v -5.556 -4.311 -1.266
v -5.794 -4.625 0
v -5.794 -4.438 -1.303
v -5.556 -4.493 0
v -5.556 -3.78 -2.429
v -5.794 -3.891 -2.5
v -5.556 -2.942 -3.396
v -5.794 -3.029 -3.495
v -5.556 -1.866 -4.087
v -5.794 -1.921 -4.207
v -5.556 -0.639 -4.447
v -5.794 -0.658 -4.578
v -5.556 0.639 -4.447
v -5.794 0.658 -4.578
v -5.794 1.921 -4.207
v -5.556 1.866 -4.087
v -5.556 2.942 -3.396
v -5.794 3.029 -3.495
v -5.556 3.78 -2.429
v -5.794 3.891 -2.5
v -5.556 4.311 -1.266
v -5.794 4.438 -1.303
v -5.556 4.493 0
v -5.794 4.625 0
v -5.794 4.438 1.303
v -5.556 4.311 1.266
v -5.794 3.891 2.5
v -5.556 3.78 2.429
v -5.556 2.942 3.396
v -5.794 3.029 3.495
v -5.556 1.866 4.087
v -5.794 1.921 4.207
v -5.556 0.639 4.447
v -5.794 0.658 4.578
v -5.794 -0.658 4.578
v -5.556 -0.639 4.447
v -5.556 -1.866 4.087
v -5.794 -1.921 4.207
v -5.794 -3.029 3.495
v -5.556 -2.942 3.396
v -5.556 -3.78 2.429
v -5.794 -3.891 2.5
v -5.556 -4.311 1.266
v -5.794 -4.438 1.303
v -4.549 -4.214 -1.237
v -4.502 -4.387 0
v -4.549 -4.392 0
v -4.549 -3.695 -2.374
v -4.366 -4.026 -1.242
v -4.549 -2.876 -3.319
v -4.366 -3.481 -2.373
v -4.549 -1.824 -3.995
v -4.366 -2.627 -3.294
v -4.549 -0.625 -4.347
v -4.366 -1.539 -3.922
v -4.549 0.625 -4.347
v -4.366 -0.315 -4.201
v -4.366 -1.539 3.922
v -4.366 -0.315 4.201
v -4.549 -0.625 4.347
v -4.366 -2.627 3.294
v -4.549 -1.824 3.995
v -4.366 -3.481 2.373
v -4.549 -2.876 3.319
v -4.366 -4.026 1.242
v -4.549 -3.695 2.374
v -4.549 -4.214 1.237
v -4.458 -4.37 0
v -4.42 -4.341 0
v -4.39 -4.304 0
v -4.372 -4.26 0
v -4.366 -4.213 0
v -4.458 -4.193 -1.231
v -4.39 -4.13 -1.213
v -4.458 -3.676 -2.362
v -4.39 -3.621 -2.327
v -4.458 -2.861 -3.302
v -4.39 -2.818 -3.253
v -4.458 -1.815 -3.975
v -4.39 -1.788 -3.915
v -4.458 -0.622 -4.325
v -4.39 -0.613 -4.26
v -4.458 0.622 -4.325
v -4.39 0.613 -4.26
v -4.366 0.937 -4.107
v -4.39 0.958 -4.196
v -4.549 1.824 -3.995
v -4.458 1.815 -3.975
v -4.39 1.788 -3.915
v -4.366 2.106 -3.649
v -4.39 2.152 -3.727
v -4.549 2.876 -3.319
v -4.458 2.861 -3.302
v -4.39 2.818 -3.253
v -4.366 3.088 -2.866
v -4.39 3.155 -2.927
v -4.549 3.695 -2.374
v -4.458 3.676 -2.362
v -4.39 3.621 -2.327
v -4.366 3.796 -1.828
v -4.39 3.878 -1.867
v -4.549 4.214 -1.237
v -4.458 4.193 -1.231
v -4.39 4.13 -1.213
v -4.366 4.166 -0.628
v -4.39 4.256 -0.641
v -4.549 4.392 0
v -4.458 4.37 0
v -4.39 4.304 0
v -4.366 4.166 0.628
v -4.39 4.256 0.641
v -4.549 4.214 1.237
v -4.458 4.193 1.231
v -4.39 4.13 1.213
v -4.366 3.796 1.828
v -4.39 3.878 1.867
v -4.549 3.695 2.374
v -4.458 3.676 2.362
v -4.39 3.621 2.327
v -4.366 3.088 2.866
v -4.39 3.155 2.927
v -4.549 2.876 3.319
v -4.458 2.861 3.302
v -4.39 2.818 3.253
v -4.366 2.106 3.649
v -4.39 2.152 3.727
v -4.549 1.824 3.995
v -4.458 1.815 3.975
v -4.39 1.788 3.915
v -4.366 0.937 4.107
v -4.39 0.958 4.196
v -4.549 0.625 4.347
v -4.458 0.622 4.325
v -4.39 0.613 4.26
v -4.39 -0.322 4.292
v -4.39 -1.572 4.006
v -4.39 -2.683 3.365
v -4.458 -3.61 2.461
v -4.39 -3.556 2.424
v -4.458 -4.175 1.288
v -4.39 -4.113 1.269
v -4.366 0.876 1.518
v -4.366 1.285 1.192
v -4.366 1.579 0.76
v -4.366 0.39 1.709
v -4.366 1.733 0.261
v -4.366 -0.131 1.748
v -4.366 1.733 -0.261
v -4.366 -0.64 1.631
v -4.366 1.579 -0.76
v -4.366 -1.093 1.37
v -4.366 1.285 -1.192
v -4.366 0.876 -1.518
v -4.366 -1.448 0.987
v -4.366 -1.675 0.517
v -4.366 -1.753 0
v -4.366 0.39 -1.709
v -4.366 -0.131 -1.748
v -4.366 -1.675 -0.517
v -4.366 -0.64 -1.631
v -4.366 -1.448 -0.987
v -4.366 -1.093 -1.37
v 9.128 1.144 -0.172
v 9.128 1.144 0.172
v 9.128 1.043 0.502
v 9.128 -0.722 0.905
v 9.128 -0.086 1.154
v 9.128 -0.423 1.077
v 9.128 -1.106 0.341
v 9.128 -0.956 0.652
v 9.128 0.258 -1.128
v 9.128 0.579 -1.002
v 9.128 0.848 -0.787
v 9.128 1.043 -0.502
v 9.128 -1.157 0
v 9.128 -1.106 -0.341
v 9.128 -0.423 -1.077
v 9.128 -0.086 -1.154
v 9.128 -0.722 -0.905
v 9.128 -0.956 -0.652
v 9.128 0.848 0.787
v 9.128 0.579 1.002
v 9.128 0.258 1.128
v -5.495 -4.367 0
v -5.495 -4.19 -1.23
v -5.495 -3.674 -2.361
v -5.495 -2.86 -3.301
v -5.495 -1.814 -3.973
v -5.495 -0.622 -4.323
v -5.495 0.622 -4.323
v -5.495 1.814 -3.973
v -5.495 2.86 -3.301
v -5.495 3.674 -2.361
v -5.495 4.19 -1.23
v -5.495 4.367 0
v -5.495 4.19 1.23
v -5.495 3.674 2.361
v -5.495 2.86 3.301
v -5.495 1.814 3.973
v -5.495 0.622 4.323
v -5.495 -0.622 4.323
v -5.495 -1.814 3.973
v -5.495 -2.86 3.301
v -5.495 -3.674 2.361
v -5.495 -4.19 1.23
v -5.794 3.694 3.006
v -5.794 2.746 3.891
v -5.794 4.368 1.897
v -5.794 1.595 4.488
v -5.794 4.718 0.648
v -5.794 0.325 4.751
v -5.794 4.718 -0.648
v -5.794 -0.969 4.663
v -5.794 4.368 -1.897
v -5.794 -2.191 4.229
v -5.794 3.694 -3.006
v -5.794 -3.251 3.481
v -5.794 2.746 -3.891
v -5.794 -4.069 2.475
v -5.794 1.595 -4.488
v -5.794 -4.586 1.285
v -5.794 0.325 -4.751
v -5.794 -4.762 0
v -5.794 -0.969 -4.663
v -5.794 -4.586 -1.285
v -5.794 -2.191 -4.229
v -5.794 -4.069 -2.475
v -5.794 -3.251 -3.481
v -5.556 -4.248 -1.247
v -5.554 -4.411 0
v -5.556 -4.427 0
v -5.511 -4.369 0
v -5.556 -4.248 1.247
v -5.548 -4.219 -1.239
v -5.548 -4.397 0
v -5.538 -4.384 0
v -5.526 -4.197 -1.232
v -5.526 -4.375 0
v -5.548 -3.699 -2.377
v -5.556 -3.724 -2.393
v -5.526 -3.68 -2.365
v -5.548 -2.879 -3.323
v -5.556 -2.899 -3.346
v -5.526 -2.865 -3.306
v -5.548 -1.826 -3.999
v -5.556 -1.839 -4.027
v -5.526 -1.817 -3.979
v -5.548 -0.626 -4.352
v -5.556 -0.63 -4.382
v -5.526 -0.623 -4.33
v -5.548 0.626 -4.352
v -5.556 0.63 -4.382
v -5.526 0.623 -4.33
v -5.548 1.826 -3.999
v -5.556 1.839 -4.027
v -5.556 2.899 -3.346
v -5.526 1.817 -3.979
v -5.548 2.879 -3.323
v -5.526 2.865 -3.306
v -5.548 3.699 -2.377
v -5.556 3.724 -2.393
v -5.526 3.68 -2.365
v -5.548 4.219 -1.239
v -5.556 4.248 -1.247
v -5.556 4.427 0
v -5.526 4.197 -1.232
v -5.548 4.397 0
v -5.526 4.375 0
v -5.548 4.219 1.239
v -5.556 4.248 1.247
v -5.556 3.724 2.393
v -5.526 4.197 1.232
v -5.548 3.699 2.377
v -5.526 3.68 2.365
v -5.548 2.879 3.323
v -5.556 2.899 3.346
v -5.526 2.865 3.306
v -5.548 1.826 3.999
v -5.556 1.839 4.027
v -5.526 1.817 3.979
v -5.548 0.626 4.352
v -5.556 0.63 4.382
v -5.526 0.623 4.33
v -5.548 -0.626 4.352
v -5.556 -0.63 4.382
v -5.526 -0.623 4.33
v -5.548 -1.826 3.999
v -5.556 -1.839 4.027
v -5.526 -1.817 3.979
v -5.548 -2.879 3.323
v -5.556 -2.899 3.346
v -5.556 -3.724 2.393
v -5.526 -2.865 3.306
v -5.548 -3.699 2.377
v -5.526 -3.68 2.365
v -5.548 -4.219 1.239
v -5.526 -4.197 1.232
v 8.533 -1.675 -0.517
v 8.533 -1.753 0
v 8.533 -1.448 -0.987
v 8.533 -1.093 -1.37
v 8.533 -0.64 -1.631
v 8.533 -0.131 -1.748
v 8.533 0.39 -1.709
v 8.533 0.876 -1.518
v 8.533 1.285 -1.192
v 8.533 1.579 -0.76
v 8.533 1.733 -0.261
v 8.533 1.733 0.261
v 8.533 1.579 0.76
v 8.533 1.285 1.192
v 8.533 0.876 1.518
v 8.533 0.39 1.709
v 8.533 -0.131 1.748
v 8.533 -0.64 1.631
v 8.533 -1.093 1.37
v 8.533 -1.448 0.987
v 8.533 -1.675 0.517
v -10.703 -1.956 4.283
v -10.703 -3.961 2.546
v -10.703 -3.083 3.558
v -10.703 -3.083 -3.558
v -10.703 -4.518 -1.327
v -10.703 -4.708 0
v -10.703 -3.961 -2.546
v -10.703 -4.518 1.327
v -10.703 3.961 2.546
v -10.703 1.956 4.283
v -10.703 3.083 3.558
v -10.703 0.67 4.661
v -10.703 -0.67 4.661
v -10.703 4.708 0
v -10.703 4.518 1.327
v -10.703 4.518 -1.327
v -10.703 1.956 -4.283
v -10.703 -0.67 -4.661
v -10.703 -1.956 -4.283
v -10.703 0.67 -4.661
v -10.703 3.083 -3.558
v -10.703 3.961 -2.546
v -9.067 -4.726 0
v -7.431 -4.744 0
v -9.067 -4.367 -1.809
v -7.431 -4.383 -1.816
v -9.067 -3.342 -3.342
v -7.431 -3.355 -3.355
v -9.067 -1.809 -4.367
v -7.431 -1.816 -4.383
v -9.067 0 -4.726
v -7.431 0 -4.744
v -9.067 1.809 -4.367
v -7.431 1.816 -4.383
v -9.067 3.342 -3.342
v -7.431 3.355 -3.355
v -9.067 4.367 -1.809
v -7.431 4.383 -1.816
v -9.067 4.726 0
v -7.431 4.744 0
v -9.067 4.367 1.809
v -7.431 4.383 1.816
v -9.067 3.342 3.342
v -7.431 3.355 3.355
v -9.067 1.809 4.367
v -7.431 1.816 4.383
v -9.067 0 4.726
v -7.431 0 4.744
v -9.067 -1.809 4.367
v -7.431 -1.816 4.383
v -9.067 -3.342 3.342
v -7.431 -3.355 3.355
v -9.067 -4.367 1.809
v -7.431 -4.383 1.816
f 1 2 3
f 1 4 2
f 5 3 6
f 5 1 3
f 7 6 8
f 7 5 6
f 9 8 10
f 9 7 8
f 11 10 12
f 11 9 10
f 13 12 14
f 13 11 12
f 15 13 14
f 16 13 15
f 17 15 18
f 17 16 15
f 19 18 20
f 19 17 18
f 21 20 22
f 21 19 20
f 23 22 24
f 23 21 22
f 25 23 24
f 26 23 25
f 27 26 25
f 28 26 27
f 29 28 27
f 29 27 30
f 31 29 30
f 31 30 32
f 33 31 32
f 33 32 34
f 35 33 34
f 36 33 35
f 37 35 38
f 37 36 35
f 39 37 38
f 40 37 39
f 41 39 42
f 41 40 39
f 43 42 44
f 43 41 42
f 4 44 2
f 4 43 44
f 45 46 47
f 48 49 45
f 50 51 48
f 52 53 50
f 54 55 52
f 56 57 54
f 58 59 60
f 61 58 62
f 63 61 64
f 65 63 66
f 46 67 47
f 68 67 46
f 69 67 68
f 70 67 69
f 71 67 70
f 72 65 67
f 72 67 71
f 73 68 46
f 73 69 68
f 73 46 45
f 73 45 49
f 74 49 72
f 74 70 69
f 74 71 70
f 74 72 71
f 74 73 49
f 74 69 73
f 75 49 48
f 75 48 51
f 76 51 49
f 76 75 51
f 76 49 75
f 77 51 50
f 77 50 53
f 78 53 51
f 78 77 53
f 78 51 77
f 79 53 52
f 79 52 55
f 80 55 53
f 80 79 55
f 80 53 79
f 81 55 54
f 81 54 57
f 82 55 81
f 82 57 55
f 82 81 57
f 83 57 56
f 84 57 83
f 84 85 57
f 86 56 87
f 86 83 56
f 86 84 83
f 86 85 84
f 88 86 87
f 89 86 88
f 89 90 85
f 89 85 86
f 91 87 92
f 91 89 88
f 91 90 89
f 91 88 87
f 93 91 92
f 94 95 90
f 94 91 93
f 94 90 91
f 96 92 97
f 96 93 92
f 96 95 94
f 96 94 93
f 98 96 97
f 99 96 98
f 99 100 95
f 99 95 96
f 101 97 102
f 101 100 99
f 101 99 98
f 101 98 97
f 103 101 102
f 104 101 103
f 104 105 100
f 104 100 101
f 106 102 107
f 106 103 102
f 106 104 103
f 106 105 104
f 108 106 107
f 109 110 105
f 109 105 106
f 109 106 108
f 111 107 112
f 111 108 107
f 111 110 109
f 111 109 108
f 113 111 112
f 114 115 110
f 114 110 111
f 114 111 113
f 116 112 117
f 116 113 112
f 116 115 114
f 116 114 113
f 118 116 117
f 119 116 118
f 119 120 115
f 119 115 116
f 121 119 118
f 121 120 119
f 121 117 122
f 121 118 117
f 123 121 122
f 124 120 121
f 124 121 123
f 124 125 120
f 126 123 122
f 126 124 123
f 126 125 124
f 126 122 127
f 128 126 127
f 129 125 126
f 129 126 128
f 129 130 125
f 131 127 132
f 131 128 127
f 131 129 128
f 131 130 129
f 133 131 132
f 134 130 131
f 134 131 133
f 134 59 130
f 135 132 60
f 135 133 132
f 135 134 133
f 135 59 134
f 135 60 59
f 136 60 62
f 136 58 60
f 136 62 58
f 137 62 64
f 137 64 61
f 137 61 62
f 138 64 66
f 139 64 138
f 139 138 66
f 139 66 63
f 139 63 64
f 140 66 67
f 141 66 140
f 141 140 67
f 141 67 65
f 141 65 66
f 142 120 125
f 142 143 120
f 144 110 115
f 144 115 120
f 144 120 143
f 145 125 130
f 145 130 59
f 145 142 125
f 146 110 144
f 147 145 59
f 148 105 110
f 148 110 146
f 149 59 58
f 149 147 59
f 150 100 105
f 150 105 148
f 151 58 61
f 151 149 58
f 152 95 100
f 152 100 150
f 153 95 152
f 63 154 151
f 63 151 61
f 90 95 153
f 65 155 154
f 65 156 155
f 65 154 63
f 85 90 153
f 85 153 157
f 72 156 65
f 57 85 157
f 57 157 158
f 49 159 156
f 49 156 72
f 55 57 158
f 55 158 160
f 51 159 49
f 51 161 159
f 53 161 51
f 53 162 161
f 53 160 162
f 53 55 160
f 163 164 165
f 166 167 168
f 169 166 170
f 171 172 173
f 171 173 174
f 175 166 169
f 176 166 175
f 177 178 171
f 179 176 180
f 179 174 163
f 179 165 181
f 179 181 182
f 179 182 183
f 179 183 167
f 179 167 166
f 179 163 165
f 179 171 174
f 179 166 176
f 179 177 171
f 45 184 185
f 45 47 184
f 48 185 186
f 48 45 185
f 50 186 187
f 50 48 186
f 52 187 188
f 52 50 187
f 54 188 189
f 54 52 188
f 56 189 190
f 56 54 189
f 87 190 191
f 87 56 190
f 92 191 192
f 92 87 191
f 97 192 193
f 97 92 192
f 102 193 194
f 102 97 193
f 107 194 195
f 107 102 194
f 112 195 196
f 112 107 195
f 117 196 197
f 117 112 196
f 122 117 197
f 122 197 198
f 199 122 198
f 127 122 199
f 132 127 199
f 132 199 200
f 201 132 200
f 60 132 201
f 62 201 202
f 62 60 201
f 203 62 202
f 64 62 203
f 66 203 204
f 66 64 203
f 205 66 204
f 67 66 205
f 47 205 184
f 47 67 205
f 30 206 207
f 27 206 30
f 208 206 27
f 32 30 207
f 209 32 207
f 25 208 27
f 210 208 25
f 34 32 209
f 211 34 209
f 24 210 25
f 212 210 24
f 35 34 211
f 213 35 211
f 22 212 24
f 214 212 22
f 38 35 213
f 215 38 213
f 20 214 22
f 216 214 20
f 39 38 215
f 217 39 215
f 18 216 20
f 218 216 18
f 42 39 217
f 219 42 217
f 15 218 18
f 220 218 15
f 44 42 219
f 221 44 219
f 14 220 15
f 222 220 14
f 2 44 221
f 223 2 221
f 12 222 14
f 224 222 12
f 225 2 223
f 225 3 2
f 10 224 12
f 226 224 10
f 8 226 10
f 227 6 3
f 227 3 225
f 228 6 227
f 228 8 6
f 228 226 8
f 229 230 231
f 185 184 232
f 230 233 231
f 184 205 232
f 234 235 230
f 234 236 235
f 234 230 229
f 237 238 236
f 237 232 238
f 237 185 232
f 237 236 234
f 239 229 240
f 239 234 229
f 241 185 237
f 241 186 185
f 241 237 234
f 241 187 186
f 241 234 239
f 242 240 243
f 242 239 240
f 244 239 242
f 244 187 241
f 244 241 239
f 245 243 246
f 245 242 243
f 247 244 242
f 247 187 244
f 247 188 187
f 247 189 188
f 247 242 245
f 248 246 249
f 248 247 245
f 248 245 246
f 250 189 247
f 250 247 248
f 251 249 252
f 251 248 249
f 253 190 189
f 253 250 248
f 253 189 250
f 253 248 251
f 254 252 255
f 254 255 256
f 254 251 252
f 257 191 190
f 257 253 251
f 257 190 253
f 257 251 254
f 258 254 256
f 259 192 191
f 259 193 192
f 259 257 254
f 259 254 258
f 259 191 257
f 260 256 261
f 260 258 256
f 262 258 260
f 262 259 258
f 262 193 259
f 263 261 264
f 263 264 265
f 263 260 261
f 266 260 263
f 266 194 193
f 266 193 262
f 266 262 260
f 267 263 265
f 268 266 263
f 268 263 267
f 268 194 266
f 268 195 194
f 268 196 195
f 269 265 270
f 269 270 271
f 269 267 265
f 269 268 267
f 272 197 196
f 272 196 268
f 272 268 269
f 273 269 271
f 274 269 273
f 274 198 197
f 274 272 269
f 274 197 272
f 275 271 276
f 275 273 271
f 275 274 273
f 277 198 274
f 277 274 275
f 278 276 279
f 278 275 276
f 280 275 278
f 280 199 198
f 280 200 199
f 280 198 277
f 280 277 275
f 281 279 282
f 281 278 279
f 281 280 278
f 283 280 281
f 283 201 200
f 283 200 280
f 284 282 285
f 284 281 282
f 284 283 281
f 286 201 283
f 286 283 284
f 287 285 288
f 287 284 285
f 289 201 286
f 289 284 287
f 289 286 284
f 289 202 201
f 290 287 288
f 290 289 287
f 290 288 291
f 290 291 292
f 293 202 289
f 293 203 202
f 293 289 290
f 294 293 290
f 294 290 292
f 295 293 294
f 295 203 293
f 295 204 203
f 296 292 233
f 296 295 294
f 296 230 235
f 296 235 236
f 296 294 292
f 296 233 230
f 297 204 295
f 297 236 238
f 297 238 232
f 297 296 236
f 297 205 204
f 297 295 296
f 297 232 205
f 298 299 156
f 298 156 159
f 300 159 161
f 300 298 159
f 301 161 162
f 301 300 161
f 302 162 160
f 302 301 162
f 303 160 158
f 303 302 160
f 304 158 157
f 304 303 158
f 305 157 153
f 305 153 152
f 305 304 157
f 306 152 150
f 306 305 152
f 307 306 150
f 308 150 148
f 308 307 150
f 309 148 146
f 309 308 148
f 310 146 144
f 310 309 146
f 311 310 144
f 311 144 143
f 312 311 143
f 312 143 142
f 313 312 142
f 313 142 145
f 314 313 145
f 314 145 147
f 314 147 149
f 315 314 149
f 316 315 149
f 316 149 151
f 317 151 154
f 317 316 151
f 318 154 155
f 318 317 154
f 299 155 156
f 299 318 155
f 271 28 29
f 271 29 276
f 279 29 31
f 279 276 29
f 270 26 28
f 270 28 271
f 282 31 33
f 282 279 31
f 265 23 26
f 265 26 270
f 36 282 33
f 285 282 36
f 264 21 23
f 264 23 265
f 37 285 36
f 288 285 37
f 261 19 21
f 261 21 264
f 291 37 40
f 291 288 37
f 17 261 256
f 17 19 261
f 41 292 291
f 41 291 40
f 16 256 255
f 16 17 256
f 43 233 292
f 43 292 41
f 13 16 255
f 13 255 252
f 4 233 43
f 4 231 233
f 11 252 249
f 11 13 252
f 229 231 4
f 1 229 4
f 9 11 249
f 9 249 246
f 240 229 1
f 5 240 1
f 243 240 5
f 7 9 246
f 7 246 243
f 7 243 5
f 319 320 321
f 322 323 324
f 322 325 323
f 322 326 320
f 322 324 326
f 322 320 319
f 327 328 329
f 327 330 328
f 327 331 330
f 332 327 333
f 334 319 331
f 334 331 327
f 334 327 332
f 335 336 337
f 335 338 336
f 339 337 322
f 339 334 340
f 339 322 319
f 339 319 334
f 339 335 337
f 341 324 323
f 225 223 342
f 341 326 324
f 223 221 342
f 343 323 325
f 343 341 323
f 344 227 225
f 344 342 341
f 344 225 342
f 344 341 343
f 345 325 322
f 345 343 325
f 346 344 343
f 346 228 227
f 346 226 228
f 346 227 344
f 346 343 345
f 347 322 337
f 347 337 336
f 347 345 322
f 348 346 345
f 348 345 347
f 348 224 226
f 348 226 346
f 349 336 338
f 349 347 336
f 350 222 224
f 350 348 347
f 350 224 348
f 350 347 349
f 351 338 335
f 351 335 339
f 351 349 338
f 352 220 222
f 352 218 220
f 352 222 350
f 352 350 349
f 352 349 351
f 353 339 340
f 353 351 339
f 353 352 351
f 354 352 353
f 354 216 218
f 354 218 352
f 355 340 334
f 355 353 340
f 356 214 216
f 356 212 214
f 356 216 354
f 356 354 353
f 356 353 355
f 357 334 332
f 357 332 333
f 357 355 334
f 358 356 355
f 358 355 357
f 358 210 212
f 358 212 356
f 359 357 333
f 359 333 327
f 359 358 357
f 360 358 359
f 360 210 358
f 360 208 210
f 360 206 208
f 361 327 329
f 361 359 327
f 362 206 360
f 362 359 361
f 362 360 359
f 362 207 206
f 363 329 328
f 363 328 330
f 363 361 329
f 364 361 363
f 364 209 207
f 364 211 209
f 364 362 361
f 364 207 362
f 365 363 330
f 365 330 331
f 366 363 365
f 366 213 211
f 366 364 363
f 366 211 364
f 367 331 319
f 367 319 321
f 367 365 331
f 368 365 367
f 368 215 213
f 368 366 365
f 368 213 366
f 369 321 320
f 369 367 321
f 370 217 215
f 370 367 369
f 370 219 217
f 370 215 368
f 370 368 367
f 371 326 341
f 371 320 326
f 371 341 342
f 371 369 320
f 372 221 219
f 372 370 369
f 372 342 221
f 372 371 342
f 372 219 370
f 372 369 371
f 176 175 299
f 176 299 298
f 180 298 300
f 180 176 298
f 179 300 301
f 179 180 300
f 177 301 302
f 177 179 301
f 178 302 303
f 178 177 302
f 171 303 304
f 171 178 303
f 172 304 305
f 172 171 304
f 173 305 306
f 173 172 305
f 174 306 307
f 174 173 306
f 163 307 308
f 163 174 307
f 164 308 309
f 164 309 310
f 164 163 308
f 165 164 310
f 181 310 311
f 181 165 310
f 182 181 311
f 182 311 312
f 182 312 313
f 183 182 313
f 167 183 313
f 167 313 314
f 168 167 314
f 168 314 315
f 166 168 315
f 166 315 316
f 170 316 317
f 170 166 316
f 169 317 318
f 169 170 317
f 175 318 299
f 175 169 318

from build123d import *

# Parameters (mm, degrees)
CHAMFER2_SIZE = 0.5953125


with BuildPart() as part:
    # Sketch3 → Revolve1 (revolve)
    with BuildSketch(Plane.XY):
        with BuildLine():
            Line((-10.702925, 2.8702), (-10.702925, 4.708465665))
            Line((-10.702925, 4.708465665), (-5.794375, 4.7625))
            Line((-5.794375, 4.7625), (-5.794375, 4.625018467))
            Line((-5.794375, 4.625018467), (-5.55625, 4.493023624))
            Line((-5.55625, 4.493023624), (-5.55625, 4.42689468))
            ThreePointArc((-5.55625, 4.42689468), (-5.538212237, 4.384141282), (-5.495001316, 4.367228853))
            Line((-5.495001316, 4.367228853), (-4.549371052, 4.391991053))
            ThreePointArc((-4.549371052, 4.391991053), (-4.419738289, 4.341253768), (-4.365625, 4.212993574))
            Line((-4.365625, 4.212993574), (-4.365625, 1.575604266))
            Line((-4.365625, 1.575604266), (-5.622925, 1.575604266))
            Line((-5.622925, 1.575604266), (-5.622925, 2.8702))
            Line((-5.622925, 2.8702), (-10.702925, 2.8702))
        make_face()
    revolve(axis=Axis((-9.128125, 0, 0), (1, 0, 0)))

    # Sketch4 → Revolve2 (revolve)
    with BuildSketch(Plane.XY):
        Polygon((-10.702925, 2.8702), (-5.622925, 2.8702), (-5.622925, 1.7526), (9.128125, 1.7526), (9.128125, 0), (-10.702925, 0), align=None)
    revolve(axis=Axis((-10.702925, 0, 0), (1, 0, 0)))

    # Chamfer2
    chamfer2_edges = [part.edges().sort_by_distance(p)[0] for p in [
        (9.128125, -1.7526, 0),
    ]]
    chamfer(chamfer2_edges, length=CHAMFER2_SIZE)


solid = part.part
